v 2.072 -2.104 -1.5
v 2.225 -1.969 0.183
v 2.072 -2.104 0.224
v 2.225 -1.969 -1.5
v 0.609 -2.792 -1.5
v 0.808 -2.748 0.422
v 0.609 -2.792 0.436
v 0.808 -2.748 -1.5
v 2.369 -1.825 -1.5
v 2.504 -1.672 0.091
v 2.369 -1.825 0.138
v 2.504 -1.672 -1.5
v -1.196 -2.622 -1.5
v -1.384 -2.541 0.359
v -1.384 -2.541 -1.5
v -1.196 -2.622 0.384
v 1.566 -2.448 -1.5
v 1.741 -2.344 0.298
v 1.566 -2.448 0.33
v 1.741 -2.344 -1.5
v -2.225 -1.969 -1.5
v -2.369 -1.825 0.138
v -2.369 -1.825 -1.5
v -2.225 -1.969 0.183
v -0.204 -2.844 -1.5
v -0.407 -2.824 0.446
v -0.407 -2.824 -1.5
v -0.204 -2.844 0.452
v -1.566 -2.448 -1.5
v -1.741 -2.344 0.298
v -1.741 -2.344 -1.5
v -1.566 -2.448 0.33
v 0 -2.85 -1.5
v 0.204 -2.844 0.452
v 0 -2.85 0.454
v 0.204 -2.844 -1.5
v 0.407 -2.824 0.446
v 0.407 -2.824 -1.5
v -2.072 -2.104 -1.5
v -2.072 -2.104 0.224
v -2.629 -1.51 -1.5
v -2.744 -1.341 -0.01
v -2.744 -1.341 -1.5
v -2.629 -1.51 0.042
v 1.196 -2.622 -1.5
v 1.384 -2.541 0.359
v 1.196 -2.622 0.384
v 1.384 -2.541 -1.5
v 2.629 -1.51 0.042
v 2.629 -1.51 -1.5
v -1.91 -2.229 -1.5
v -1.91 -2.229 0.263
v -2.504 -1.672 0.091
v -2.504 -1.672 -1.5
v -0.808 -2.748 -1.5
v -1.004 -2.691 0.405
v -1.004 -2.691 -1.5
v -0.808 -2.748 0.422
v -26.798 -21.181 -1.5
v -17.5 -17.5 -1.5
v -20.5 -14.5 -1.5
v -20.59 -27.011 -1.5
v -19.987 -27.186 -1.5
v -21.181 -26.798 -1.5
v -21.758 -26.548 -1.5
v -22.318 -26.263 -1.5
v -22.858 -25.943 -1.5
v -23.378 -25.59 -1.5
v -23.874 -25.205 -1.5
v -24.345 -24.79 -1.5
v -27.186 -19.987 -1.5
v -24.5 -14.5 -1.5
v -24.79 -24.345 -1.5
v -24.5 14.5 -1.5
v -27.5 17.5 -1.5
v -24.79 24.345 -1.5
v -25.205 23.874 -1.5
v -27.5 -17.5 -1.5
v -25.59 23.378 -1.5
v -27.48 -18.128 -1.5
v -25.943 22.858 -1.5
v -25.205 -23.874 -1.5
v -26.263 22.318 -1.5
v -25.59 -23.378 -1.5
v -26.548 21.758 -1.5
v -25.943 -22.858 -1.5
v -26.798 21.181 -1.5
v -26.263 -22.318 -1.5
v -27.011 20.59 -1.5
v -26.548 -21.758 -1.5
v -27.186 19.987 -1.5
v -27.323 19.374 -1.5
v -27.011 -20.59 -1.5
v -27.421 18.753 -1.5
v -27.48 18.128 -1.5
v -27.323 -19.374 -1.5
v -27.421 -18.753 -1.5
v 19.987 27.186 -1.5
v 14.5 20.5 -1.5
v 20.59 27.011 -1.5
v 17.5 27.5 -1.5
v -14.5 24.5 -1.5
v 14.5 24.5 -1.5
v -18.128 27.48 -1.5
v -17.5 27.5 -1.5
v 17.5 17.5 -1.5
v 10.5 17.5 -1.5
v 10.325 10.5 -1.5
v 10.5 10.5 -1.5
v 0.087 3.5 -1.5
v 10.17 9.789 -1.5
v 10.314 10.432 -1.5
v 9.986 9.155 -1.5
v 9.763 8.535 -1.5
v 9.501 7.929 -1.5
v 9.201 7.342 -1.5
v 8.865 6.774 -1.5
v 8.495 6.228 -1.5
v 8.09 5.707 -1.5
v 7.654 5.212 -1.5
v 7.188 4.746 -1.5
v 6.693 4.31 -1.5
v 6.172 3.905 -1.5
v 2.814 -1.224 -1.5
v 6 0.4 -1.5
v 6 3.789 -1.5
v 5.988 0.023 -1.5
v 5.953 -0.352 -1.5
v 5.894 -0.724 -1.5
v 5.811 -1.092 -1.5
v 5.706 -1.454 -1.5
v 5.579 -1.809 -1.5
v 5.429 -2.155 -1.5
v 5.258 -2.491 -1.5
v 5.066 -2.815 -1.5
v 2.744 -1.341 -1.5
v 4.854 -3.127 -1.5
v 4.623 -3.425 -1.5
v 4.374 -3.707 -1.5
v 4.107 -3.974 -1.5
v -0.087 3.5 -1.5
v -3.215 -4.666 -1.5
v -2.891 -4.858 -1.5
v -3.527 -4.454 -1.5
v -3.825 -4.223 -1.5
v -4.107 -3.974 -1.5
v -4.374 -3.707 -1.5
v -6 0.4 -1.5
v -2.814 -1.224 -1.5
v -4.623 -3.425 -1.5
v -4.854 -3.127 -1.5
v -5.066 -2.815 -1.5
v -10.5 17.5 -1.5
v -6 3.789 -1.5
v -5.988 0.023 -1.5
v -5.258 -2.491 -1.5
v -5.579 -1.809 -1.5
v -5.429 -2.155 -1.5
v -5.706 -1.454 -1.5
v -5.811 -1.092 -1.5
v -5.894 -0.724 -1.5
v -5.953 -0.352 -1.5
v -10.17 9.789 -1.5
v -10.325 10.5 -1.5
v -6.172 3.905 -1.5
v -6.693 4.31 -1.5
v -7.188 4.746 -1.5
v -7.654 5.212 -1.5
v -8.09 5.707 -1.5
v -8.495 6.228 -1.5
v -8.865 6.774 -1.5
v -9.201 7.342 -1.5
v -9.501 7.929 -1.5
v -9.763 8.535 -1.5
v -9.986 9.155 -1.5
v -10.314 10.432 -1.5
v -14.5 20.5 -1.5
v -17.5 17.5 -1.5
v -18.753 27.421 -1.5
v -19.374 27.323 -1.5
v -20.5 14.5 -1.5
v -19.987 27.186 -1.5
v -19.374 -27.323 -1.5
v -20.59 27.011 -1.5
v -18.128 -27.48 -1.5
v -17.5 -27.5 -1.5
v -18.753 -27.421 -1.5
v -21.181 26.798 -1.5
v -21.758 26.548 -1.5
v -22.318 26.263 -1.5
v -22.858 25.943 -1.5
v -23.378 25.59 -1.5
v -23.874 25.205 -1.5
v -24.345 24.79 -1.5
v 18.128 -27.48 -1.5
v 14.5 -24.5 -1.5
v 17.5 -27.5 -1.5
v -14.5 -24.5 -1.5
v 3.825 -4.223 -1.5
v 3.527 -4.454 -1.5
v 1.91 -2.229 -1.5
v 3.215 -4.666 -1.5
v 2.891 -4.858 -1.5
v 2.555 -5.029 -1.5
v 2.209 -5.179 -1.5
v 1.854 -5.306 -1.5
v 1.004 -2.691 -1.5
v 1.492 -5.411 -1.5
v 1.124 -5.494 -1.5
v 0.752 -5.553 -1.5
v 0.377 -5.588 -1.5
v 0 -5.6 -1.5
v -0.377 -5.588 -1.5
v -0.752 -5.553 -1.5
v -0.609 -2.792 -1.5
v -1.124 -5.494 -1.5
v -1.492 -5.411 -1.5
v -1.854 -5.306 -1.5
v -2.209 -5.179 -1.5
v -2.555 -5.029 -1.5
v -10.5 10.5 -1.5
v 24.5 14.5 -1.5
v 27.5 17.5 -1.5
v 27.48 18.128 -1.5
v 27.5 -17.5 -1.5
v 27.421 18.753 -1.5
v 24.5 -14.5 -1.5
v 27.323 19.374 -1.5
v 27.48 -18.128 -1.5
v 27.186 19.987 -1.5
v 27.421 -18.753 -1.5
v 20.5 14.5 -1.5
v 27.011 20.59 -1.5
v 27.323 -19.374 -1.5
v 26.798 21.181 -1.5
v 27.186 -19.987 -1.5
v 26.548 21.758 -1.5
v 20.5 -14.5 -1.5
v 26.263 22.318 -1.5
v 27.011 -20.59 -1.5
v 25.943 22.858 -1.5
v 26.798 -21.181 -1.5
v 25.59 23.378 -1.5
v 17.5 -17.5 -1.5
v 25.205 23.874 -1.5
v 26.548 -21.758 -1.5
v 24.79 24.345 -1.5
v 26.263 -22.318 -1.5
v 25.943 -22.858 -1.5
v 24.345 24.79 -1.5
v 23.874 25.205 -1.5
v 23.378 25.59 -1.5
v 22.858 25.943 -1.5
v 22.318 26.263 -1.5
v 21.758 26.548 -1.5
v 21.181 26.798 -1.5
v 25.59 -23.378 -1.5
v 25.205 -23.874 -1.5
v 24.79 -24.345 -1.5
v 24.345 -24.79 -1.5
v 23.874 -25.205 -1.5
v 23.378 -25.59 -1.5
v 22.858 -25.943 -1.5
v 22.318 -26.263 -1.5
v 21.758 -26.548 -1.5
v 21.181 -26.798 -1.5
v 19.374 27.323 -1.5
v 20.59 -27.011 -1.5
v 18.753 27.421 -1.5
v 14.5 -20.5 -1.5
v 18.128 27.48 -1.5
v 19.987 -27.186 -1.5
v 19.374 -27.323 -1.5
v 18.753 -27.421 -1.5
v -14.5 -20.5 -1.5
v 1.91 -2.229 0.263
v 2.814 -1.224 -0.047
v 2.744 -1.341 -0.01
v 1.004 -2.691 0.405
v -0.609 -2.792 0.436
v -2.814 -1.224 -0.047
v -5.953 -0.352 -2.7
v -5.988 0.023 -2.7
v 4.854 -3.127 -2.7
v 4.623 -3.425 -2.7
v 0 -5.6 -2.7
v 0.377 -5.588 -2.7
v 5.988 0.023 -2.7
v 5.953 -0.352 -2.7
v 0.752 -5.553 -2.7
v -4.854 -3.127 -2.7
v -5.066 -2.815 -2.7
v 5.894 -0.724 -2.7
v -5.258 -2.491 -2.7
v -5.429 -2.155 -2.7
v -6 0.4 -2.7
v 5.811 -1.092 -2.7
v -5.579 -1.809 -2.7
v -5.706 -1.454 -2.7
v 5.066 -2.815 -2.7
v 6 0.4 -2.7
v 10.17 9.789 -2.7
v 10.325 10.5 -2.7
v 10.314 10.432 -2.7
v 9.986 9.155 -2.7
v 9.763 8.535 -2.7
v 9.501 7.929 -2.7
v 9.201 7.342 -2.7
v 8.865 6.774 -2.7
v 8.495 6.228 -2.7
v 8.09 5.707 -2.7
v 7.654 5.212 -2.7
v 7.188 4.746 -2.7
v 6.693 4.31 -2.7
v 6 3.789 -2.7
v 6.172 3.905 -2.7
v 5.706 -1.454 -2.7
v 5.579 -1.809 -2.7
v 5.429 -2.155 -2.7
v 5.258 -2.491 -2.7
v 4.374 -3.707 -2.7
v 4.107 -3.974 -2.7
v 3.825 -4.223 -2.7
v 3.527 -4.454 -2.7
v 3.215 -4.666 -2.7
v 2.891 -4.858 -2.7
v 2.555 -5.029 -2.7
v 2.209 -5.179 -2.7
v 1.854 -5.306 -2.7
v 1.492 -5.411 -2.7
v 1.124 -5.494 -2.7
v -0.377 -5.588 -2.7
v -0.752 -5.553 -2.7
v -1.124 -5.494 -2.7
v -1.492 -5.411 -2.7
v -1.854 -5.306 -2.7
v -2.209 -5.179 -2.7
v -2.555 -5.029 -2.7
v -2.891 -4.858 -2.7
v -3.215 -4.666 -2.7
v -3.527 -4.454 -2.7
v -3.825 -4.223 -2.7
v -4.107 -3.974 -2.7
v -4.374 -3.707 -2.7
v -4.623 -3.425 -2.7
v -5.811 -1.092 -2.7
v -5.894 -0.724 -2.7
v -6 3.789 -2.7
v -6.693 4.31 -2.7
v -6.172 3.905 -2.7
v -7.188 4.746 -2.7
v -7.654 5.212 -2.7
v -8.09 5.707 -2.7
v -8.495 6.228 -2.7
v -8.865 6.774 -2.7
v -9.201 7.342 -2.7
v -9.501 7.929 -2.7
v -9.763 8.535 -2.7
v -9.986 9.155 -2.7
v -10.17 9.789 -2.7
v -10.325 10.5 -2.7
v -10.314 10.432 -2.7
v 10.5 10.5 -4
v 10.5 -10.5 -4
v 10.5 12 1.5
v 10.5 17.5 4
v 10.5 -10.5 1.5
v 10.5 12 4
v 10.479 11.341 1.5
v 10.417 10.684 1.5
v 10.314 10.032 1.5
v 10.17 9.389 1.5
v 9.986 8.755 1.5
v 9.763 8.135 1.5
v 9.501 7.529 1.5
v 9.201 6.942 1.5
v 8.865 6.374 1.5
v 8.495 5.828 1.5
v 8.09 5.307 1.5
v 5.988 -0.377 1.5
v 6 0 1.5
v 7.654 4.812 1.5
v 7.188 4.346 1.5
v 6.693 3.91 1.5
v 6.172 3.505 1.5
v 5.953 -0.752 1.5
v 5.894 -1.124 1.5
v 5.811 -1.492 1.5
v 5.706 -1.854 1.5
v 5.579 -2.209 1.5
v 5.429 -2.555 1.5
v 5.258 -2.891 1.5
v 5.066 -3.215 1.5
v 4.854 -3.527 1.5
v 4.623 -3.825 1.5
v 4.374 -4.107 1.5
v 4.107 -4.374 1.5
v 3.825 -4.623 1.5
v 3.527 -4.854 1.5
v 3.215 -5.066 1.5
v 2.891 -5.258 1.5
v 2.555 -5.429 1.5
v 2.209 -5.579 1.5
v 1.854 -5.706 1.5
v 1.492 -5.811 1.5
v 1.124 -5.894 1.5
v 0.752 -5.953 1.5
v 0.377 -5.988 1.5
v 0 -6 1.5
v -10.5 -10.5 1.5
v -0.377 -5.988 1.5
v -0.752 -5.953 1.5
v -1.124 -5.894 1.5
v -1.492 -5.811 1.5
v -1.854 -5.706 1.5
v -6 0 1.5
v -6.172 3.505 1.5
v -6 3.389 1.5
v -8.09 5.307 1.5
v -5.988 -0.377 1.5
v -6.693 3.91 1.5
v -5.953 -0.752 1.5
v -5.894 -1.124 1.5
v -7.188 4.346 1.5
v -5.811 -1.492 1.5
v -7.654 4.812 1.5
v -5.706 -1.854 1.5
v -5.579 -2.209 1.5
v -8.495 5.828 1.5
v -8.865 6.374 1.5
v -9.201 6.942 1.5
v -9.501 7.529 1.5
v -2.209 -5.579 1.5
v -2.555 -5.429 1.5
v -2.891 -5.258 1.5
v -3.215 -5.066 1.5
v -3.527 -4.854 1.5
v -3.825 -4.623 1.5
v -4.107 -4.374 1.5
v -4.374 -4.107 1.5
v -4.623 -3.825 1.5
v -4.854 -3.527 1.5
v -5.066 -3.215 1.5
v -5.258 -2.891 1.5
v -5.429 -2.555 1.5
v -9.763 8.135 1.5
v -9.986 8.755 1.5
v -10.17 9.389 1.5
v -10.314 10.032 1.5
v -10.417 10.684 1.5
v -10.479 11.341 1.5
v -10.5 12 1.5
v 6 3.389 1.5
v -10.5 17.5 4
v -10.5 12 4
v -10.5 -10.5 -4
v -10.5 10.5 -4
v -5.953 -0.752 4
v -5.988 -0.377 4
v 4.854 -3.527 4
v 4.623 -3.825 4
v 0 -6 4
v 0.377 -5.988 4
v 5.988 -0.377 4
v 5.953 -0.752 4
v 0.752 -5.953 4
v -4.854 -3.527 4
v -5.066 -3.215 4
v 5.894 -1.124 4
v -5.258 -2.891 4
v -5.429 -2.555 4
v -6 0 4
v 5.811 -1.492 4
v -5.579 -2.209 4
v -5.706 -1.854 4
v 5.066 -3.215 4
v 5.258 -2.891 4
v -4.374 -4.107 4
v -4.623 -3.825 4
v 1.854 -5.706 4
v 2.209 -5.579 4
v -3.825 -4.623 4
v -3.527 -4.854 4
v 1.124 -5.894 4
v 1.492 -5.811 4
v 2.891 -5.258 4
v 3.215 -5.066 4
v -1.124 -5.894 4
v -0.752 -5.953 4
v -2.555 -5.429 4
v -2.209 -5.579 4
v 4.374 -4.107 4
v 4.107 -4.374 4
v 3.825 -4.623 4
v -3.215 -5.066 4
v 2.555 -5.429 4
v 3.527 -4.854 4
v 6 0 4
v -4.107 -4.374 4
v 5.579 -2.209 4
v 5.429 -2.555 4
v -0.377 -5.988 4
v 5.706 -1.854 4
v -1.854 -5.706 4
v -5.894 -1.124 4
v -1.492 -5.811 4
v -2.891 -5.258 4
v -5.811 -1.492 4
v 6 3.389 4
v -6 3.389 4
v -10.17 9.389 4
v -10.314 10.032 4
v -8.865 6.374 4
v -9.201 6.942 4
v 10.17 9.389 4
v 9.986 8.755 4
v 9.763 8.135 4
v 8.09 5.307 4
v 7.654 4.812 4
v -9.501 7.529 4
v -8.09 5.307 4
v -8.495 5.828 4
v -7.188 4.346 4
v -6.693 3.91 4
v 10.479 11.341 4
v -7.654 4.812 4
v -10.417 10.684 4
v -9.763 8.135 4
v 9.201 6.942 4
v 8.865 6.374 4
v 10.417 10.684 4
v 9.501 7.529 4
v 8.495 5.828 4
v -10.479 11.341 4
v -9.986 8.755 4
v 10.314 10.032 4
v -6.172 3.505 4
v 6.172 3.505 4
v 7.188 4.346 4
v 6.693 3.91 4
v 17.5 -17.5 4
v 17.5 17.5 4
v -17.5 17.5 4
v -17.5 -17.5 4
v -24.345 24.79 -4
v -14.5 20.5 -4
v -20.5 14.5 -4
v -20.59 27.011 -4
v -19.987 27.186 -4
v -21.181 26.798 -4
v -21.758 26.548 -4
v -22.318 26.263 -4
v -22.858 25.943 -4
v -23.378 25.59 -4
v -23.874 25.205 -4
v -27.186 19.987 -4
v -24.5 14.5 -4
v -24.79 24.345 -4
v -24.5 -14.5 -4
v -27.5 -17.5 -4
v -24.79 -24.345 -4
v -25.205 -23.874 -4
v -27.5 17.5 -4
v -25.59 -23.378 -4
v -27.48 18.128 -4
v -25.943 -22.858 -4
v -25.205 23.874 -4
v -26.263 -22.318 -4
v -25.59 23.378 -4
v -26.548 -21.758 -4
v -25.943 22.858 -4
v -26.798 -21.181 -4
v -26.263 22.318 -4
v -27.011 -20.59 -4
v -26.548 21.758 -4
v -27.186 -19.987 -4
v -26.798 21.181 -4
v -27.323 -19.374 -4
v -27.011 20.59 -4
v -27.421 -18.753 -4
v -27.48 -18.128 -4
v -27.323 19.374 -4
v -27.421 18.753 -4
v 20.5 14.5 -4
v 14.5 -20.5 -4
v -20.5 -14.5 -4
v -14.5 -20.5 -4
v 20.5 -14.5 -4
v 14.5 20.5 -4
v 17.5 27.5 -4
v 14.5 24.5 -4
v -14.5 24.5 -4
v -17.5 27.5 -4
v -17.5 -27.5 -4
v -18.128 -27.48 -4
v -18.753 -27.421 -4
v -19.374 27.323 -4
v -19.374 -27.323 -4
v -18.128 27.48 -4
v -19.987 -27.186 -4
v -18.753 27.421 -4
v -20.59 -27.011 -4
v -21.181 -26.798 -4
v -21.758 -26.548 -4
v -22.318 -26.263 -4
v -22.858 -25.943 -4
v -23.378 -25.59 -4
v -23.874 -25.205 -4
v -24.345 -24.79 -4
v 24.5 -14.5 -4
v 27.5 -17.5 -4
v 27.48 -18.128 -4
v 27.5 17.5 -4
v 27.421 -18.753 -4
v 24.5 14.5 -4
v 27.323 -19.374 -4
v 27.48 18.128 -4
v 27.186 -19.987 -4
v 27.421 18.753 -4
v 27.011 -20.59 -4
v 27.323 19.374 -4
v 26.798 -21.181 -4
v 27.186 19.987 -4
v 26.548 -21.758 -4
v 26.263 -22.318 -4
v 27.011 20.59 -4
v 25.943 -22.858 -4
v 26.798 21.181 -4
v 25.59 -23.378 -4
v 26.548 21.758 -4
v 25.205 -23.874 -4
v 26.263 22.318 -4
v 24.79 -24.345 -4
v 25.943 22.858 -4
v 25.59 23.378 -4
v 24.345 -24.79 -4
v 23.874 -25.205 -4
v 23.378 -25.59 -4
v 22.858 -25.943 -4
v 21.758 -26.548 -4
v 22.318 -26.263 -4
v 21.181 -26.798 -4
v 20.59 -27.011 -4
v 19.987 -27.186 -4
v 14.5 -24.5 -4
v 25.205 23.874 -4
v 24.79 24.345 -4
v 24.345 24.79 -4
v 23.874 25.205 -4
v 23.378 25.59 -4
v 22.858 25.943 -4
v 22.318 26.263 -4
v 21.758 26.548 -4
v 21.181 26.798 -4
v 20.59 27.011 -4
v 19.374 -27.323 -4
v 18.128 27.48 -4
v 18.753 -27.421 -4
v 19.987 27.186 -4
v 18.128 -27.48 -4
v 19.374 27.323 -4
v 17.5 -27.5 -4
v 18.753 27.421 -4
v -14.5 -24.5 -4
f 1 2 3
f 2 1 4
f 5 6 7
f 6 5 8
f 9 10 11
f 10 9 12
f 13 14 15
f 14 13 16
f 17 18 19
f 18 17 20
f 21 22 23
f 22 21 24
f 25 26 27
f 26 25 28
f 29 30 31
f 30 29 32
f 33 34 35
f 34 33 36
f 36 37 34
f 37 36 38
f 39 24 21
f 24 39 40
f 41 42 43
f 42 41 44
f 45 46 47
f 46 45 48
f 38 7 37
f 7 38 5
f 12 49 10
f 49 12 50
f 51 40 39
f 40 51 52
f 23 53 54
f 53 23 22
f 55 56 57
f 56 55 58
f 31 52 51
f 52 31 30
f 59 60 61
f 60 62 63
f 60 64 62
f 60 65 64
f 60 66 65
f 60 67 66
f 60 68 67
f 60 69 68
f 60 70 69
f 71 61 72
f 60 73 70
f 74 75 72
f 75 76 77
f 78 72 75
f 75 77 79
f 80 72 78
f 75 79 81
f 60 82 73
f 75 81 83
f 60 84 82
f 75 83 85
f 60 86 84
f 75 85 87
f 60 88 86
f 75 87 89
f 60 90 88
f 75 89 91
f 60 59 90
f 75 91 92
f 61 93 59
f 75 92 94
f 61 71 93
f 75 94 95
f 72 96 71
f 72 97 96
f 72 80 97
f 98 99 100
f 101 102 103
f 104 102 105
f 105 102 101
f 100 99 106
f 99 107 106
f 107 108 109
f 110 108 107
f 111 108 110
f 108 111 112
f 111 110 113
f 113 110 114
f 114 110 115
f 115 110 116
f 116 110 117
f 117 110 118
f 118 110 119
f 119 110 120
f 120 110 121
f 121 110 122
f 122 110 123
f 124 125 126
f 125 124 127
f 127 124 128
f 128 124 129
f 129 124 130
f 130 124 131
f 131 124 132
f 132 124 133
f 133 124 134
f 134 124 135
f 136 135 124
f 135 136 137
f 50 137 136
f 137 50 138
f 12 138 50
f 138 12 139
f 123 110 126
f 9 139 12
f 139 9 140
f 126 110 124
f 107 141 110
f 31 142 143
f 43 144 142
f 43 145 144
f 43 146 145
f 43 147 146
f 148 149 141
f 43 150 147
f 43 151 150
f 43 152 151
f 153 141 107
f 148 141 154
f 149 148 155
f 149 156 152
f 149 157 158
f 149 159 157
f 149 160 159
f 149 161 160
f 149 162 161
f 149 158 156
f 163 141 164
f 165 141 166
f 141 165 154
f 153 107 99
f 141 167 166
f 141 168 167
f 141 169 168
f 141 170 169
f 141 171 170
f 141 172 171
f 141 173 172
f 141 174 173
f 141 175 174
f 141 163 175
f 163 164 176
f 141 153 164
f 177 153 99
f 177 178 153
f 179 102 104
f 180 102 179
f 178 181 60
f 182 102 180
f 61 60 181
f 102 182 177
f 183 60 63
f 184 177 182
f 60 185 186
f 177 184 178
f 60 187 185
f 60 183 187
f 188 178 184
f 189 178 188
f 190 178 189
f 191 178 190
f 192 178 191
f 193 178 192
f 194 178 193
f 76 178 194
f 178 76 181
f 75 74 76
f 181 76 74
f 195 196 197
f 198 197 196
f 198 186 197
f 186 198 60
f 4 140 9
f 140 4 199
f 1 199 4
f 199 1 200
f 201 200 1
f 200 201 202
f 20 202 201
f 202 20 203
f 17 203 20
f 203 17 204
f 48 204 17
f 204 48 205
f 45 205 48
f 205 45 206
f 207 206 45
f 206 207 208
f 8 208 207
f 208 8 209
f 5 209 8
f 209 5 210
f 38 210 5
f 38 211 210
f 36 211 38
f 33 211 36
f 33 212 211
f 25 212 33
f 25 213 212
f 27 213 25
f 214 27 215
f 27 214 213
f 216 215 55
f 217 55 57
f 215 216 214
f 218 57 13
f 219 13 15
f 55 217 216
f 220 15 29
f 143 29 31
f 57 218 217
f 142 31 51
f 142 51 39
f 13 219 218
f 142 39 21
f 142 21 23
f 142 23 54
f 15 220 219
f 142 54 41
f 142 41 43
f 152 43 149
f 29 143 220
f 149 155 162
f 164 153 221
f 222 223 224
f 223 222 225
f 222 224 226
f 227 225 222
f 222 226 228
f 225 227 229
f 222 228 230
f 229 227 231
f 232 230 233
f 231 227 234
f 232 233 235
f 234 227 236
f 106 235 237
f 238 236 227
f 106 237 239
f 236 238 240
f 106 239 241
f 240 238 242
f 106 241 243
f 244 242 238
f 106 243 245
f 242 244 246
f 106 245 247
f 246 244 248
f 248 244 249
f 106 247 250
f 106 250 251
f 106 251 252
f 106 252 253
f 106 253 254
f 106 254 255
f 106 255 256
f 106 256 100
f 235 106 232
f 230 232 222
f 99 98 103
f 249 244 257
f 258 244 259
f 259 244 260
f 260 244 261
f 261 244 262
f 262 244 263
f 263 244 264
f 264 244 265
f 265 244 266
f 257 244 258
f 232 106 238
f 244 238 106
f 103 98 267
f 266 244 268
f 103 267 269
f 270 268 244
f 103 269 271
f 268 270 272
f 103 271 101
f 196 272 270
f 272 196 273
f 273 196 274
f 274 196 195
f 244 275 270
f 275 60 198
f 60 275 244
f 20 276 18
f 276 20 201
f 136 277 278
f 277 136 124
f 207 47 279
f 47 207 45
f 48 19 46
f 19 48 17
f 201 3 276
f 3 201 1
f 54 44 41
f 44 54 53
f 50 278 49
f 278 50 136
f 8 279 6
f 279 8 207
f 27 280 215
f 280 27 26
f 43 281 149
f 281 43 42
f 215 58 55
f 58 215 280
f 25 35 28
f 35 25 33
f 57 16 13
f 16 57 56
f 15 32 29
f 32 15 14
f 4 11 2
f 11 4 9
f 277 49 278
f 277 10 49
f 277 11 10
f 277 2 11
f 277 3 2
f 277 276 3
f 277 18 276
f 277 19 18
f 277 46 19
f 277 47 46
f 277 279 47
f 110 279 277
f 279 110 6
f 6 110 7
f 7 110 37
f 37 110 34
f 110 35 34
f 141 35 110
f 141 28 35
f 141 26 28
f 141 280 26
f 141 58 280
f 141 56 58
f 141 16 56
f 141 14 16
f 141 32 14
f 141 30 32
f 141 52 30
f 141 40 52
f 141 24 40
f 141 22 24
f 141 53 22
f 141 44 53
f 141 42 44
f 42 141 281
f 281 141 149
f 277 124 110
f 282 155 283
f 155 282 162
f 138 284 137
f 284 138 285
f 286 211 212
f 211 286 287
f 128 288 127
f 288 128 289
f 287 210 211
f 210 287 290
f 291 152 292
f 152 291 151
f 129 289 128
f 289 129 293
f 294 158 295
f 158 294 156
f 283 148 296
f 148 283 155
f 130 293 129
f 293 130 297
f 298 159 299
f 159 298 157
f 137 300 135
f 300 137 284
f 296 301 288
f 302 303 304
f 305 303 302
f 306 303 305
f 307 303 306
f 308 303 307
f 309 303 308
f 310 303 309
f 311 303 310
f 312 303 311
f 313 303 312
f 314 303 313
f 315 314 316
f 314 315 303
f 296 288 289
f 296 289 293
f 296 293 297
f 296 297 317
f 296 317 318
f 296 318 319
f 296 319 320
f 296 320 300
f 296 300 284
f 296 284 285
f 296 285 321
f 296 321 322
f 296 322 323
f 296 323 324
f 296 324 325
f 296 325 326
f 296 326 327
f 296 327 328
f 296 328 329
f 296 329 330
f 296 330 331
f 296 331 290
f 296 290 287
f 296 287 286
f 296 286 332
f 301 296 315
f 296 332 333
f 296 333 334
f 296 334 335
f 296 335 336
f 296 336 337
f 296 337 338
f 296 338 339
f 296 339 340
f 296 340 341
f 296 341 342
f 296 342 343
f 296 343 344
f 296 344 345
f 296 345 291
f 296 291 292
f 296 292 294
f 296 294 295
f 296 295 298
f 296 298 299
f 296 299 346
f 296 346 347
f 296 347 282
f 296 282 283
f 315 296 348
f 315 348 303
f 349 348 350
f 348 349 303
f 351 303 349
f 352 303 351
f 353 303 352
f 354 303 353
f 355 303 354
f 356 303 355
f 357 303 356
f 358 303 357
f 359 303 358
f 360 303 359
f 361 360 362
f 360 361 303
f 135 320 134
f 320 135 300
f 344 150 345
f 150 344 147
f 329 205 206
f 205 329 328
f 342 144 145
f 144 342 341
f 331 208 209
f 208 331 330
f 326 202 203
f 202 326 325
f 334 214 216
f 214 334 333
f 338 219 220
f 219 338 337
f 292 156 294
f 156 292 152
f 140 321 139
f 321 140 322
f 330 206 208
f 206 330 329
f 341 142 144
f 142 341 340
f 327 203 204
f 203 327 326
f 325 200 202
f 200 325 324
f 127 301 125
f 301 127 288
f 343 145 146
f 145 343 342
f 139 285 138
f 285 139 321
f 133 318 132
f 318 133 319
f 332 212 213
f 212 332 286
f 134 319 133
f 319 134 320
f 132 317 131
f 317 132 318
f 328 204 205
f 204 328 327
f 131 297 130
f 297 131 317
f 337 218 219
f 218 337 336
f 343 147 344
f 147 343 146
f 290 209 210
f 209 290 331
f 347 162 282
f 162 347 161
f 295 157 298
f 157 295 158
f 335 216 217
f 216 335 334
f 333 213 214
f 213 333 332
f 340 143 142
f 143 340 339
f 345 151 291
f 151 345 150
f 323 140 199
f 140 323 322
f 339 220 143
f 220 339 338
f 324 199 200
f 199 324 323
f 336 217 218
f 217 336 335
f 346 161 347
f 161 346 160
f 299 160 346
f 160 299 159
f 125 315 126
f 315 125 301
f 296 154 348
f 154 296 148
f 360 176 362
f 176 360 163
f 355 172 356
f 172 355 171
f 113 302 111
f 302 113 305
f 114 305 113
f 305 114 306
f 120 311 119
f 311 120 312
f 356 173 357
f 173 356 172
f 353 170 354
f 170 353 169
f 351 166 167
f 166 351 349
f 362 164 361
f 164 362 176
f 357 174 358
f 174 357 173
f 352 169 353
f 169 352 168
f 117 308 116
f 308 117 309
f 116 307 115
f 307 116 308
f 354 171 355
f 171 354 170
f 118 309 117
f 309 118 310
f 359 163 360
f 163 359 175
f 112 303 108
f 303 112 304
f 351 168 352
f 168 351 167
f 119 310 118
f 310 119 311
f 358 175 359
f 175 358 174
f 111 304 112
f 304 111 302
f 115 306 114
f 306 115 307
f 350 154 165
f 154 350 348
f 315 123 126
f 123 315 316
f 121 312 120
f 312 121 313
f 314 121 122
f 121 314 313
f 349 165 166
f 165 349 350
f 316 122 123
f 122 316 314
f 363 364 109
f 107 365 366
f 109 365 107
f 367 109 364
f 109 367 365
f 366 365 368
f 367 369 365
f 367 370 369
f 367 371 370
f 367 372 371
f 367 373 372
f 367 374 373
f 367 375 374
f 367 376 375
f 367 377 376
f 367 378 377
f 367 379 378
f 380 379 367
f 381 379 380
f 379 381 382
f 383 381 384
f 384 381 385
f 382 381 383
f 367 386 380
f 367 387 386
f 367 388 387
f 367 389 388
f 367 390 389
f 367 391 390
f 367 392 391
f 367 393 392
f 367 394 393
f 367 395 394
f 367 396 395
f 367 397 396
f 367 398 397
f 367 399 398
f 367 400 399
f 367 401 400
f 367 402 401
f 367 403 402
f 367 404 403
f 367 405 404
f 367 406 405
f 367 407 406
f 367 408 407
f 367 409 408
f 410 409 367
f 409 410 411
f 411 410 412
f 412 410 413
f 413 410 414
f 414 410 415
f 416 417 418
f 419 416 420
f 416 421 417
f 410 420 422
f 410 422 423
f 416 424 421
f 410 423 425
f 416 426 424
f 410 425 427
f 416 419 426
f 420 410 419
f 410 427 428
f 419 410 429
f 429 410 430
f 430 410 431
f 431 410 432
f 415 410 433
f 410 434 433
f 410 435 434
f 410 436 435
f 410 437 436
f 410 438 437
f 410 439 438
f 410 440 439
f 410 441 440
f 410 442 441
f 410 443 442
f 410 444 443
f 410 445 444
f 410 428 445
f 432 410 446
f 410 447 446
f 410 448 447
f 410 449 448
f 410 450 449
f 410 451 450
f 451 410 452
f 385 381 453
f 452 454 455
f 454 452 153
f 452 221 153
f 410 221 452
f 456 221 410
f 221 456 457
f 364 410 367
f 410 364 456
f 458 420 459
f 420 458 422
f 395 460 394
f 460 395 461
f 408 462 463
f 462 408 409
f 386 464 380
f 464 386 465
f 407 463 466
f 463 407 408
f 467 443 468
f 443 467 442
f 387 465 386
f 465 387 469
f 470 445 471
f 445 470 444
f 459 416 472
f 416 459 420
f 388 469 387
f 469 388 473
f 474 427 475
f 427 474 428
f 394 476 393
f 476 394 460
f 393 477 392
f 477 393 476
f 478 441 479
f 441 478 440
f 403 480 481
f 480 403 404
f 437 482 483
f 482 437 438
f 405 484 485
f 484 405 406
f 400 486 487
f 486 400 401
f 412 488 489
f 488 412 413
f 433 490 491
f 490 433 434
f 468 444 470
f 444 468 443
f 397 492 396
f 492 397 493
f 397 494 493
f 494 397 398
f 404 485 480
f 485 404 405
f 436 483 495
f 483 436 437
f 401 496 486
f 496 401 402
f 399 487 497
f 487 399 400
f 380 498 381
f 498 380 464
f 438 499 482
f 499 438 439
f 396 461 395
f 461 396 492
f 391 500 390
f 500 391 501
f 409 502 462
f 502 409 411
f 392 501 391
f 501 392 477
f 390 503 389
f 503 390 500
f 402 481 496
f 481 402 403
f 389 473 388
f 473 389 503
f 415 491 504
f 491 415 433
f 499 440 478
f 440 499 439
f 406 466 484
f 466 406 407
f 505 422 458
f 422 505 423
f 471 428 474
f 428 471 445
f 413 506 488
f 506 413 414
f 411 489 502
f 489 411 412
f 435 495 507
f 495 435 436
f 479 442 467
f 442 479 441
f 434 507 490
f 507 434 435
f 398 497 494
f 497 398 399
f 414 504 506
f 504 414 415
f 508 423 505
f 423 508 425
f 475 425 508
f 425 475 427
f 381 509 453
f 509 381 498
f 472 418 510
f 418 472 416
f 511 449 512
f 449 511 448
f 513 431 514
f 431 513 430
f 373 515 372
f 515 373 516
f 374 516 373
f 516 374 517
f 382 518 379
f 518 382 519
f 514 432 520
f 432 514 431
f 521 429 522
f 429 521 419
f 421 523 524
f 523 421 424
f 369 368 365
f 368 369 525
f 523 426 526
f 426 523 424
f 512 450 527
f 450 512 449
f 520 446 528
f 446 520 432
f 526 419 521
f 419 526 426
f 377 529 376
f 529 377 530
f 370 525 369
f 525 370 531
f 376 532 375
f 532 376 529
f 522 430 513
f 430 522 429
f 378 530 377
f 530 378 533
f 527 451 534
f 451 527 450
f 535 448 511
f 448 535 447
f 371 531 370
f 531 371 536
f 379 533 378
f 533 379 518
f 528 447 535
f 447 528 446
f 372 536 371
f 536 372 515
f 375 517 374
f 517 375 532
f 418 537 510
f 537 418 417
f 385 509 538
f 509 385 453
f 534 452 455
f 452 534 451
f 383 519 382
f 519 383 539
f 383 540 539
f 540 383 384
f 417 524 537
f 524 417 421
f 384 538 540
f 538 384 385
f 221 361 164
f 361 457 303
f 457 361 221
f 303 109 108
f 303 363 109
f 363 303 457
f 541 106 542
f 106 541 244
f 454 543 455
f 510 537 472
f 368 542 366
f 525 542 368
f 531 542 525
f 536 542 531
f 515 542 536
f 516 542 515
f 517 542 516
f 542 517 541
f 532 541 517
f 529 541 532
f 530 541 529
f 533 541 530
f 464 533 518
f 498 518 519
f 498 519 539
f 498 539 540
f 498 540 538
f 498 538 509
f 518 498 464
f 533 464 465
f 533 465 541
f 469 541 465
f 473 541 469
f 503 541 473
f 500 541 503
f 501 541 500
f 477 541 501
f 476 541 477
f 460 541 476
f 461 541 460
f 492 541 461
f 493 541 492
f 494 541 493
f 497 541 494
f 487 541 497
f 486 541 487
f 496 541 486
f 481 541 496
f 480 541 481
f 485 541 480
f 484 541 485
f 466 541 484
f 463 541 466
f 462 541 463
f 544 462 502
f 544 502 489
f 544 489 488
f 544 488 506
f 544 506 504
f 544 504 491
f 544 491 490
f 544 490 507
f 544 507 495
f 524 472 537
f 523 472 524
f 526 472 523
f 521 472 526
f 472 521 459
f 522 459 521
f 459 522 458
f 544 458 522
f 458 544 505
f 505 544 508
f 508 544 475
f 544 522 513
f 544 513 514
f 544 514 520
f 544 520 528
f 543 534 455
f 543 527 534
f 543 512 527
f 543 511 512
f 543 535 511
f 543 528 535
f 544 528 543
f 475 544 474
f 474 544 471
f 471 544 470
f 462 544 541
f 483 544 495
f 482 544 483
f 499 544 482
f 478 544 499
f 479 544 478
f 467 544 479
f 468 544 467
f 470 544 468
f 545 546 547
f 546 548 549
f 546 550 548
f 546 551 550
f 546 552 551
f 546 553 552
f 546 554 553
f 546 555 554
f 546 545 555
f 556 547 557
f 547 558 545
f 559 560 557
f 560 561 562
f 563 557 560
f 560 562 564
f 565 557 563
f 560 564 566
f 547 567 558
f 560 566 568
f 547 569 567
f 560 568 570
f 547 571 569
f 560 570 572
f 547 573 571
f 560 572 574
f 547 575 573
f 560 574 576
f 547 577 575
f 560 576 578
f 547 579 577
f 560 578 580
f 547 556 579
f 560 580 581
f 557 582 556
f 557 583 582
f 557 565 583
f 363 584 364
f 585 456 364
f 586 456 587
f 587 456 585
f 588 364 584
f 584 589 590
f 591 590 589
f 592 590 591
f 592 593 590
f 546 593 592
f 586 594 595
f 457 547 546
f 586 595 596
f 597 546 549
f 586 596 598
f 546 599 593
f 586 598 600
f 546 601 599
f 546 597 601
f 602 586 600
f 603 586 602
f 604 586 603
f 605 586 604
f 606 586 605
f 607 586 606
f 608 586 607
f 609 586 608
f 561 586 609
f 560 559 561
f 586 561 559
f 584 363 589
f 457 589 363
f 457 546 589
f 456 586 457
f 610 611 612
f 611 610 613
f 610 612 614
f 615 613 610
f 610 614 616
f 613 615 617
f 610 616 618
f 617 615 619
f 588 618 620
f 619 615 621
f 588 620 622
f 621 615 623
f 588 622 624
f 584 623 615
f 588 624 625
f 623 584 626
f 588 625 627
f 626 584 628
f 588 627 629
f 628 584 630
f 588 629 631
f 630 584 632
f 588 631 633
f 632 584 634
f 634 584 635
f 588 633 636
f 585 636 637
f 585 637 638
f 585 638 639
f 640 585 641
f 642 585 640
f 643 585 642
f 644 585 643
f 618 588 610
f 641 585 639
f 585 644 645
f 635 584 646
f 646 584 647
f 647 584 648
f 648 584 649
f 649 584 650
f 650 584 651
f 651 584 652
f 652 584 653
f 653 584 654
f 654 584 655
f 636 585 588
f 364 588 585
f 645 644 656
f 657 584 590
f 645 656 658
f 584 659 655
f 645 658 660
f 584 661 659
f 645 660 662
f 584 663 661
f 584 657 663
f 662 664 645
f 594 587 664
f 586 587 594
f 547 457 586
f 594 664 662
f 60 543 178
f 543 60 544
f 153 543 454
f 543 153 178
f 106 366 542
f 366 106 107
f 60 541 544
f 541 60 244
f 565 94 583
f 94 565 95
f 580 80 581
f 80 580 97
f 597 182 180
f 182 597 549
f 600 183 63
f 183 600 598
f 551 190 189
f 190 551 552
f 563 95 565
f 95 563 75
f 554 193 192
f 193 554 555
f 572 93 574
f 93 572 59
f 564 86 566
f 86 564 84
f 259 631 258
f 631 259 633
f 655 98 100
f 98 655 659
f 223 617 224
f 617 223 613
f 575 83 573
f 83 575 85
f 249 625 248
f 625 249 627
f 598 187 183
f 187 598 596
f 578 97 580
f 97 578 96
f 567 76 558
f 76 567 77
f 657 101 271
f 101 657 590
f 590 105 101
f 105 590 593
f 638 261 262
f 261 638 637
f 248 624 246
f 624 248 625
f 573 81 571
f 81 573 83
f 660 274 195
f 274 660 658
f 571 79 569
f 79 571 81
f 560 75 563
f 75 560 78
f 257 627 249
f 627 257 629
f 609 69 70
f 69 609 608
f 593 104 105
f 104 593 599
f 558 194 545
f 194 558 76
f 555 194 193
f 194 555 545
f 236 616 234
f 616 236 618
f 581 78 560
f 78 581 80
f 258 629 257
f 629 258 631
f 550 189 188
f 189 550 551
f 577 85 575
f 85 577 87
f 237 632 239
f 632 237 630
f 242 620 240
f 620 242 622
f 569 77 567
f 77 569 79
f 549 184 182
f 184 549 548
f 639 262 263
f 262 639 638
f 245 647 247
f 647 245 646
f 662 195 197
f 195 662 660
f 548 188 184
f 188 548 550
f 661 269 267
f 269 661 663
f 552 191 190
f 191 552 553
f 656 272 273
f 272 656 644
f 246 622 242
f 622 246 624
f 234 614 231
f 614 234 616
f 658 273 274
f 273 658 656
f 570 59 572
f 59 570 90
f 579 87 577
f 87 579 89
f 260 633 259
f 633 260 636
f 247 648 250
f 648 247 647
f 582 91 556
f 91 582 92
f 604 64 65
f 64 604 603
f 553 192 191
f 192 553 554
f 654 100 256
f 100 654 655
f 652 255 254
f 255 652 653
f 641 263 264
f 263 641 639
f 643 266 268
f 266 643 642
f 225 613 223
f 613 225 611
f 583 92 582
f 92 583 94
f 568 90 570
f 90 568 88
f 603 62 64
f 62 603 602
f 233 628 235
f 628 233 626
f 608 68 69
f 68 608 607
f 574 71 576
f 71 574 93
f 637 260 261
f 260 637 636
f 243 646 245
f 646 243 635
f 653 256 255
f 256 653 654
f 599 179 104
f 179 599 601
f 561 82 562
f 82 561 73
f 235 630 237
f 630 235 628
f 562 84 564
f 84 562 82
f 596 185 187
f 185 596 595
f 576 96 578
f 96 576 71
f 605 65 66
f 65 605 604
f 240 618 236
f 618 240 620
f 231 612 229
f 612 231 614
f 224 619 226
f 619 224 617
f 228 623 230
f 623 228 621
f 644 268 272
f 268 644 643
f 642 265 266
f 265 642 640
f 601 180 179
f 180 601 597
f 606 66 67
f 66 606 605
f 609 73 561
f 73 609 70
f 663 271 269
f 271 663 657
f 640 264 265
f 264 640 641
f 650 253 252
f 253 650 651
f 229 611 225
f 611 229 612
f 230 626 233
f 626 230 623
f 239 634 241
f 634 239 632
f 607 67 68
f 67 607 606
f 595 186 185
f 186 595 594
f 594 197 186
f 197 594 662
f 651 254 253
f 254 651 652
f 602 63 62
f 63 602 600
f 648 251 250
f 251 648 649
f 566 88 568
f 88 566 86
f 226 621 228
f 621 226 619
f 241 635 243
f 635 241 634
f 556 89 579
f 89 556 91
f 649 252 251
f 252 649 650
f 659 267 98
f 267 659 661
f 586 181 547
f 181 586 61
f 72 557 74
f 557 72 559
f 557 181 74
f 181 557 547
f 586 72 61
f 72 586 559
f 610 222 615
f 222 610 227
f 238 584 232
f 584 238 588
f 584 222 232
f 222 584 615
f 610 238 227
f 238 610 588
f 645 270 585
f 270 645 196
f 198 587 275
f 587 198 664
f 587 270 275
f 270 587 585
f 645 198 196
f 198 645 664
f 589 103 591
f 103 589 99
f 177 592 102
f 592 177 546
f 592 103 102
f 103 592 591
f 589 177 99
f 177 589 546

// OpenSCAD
// mount width
mw = 35;

// mount height
mh = 8;

// mount length
ml = 35;

// brim width
bw = 10;

// brim height
bh = 2.5;

// brim hole width
bhw = 4;


// hole diameter
hd = 12;

// hole width
ht = 1;

// hole height
hh = 1.2;


// inlet width
iw = 21;

// inlet height
ih = 3;

// inlet length
il = 60;

// inlet distance
id = 12;

// inlet canal length
icl = 10;


// clip thickness
ct = 1.2;

// clip offset
co = 0.4;


// nub diameter
nd = 6.5;

// nub thickness
nt = 1;

// nub height
nh = 2;

//nub tip angle
na = 60;

$fn = 100;

module nub() {
	difference() {
		translate([0,0,-ih/2+nh/2])
		cylinder(nh, d = nd, center=true);

		translate([0,nd,-ih/2])
		rotate(-atan(nh/nd), [1,0,0])
		translate([0,-nd,0])
		cube([nd*1.1,nd*1.1,nh], center=true);

		translate([0,nd/2,-ih/2])
		rotate(-na/2, [0,0,1])
		translate([-nd*1.1,-nd*2,0])
		cube([nd*1.1,nd*2.1,nh*1.1], center=false);

		translate([0,nd/2,-ih/2])
		rotate(na/2, [0,0,1])
		translate([0,-nd*2,0])
		cube([nd*1.1,nd*2.1,nh*1.1], center=false);

	}
}

module clip() {
	intersection() {
		translate([0,co,0])
		union() {
			translate([0,0,-ct/2-ih/2])
			cylinder(h=ct, r= hd/2, center=true);

			translate([0,icl/2,-ct/2-ih/2])
			cube(size=[hd,icl,ct], center=true);

			translate([0,12,-ct/2-ih/2])
			cylinder(h=ct, d=iw, center=true);

			nub();

		}
		cube([mw,ml,mh], center = true);
	}
}

module inlet() {
	union() {
		translate([0,il/2-iw/2,0])
		cube([iw,il,ih], center = true);

		translate([0,0,mh/2])
		cylinder(h=1.01*mh, r= hd/2, center=true);

		translate([0,10,10])
		cube(size=[hd,20,20], center=true);

		translate([0,12,mh/2])
		cylinder(h=1.01*mh, d=iw, center=true);

		translate([0,id+il/2,ih])
		cube([iw,il,ih*2.01], center = true);

		translate([0,0,-mh/2])
		cube([iw,iw,mh], center = true);
	}
}


module handlebrim(){

	translate([0,0,-mh/2])
	difference() {

		translate([-mw/2,-ml/2,0])
		minkowski() {
			cube([mw,ml,bh/2], center = false);
			// cube([sw - sr * 2, sl - sr * 2, sh/2]);
			// translate([sr, sr, 0])
			cylinder(r = bw, h = bh/2, center = false);
		}
		translate([0,0,bh/2])
		cube([iw,iw,bh*1.1], center = true);

		translate([(-mw-bw)/2,0,bh/2])
		cube([bhw,ml-bw+bhw,bh*1.1], center=true);

		translate([(mw+bw)/2,0,bh/2])
		cube([bhw,ml-bw+bhw,bh*1.1], center=true);

		translate([0,(-ml-bw)/2,bh/2])
		cube([mw-bw+bhw,bhw,bh*1.1], center=true);

		translate([0,(ml+bw)/2,bh/2])
		cube([mw-bw+bhw,bhw,bh*1.1], center=true);

	}
}

module mount() {
	difference() {
		cube([mw,ml,mh], center = true);
		inlet();
	}
}


module klickfast () {

	union() {
		clip();
		mount();
		handlebrim();
	}

}

// rotate(90, [1,0,0])
klickfast();
// translate([0,0,0])clip();
// mount();
